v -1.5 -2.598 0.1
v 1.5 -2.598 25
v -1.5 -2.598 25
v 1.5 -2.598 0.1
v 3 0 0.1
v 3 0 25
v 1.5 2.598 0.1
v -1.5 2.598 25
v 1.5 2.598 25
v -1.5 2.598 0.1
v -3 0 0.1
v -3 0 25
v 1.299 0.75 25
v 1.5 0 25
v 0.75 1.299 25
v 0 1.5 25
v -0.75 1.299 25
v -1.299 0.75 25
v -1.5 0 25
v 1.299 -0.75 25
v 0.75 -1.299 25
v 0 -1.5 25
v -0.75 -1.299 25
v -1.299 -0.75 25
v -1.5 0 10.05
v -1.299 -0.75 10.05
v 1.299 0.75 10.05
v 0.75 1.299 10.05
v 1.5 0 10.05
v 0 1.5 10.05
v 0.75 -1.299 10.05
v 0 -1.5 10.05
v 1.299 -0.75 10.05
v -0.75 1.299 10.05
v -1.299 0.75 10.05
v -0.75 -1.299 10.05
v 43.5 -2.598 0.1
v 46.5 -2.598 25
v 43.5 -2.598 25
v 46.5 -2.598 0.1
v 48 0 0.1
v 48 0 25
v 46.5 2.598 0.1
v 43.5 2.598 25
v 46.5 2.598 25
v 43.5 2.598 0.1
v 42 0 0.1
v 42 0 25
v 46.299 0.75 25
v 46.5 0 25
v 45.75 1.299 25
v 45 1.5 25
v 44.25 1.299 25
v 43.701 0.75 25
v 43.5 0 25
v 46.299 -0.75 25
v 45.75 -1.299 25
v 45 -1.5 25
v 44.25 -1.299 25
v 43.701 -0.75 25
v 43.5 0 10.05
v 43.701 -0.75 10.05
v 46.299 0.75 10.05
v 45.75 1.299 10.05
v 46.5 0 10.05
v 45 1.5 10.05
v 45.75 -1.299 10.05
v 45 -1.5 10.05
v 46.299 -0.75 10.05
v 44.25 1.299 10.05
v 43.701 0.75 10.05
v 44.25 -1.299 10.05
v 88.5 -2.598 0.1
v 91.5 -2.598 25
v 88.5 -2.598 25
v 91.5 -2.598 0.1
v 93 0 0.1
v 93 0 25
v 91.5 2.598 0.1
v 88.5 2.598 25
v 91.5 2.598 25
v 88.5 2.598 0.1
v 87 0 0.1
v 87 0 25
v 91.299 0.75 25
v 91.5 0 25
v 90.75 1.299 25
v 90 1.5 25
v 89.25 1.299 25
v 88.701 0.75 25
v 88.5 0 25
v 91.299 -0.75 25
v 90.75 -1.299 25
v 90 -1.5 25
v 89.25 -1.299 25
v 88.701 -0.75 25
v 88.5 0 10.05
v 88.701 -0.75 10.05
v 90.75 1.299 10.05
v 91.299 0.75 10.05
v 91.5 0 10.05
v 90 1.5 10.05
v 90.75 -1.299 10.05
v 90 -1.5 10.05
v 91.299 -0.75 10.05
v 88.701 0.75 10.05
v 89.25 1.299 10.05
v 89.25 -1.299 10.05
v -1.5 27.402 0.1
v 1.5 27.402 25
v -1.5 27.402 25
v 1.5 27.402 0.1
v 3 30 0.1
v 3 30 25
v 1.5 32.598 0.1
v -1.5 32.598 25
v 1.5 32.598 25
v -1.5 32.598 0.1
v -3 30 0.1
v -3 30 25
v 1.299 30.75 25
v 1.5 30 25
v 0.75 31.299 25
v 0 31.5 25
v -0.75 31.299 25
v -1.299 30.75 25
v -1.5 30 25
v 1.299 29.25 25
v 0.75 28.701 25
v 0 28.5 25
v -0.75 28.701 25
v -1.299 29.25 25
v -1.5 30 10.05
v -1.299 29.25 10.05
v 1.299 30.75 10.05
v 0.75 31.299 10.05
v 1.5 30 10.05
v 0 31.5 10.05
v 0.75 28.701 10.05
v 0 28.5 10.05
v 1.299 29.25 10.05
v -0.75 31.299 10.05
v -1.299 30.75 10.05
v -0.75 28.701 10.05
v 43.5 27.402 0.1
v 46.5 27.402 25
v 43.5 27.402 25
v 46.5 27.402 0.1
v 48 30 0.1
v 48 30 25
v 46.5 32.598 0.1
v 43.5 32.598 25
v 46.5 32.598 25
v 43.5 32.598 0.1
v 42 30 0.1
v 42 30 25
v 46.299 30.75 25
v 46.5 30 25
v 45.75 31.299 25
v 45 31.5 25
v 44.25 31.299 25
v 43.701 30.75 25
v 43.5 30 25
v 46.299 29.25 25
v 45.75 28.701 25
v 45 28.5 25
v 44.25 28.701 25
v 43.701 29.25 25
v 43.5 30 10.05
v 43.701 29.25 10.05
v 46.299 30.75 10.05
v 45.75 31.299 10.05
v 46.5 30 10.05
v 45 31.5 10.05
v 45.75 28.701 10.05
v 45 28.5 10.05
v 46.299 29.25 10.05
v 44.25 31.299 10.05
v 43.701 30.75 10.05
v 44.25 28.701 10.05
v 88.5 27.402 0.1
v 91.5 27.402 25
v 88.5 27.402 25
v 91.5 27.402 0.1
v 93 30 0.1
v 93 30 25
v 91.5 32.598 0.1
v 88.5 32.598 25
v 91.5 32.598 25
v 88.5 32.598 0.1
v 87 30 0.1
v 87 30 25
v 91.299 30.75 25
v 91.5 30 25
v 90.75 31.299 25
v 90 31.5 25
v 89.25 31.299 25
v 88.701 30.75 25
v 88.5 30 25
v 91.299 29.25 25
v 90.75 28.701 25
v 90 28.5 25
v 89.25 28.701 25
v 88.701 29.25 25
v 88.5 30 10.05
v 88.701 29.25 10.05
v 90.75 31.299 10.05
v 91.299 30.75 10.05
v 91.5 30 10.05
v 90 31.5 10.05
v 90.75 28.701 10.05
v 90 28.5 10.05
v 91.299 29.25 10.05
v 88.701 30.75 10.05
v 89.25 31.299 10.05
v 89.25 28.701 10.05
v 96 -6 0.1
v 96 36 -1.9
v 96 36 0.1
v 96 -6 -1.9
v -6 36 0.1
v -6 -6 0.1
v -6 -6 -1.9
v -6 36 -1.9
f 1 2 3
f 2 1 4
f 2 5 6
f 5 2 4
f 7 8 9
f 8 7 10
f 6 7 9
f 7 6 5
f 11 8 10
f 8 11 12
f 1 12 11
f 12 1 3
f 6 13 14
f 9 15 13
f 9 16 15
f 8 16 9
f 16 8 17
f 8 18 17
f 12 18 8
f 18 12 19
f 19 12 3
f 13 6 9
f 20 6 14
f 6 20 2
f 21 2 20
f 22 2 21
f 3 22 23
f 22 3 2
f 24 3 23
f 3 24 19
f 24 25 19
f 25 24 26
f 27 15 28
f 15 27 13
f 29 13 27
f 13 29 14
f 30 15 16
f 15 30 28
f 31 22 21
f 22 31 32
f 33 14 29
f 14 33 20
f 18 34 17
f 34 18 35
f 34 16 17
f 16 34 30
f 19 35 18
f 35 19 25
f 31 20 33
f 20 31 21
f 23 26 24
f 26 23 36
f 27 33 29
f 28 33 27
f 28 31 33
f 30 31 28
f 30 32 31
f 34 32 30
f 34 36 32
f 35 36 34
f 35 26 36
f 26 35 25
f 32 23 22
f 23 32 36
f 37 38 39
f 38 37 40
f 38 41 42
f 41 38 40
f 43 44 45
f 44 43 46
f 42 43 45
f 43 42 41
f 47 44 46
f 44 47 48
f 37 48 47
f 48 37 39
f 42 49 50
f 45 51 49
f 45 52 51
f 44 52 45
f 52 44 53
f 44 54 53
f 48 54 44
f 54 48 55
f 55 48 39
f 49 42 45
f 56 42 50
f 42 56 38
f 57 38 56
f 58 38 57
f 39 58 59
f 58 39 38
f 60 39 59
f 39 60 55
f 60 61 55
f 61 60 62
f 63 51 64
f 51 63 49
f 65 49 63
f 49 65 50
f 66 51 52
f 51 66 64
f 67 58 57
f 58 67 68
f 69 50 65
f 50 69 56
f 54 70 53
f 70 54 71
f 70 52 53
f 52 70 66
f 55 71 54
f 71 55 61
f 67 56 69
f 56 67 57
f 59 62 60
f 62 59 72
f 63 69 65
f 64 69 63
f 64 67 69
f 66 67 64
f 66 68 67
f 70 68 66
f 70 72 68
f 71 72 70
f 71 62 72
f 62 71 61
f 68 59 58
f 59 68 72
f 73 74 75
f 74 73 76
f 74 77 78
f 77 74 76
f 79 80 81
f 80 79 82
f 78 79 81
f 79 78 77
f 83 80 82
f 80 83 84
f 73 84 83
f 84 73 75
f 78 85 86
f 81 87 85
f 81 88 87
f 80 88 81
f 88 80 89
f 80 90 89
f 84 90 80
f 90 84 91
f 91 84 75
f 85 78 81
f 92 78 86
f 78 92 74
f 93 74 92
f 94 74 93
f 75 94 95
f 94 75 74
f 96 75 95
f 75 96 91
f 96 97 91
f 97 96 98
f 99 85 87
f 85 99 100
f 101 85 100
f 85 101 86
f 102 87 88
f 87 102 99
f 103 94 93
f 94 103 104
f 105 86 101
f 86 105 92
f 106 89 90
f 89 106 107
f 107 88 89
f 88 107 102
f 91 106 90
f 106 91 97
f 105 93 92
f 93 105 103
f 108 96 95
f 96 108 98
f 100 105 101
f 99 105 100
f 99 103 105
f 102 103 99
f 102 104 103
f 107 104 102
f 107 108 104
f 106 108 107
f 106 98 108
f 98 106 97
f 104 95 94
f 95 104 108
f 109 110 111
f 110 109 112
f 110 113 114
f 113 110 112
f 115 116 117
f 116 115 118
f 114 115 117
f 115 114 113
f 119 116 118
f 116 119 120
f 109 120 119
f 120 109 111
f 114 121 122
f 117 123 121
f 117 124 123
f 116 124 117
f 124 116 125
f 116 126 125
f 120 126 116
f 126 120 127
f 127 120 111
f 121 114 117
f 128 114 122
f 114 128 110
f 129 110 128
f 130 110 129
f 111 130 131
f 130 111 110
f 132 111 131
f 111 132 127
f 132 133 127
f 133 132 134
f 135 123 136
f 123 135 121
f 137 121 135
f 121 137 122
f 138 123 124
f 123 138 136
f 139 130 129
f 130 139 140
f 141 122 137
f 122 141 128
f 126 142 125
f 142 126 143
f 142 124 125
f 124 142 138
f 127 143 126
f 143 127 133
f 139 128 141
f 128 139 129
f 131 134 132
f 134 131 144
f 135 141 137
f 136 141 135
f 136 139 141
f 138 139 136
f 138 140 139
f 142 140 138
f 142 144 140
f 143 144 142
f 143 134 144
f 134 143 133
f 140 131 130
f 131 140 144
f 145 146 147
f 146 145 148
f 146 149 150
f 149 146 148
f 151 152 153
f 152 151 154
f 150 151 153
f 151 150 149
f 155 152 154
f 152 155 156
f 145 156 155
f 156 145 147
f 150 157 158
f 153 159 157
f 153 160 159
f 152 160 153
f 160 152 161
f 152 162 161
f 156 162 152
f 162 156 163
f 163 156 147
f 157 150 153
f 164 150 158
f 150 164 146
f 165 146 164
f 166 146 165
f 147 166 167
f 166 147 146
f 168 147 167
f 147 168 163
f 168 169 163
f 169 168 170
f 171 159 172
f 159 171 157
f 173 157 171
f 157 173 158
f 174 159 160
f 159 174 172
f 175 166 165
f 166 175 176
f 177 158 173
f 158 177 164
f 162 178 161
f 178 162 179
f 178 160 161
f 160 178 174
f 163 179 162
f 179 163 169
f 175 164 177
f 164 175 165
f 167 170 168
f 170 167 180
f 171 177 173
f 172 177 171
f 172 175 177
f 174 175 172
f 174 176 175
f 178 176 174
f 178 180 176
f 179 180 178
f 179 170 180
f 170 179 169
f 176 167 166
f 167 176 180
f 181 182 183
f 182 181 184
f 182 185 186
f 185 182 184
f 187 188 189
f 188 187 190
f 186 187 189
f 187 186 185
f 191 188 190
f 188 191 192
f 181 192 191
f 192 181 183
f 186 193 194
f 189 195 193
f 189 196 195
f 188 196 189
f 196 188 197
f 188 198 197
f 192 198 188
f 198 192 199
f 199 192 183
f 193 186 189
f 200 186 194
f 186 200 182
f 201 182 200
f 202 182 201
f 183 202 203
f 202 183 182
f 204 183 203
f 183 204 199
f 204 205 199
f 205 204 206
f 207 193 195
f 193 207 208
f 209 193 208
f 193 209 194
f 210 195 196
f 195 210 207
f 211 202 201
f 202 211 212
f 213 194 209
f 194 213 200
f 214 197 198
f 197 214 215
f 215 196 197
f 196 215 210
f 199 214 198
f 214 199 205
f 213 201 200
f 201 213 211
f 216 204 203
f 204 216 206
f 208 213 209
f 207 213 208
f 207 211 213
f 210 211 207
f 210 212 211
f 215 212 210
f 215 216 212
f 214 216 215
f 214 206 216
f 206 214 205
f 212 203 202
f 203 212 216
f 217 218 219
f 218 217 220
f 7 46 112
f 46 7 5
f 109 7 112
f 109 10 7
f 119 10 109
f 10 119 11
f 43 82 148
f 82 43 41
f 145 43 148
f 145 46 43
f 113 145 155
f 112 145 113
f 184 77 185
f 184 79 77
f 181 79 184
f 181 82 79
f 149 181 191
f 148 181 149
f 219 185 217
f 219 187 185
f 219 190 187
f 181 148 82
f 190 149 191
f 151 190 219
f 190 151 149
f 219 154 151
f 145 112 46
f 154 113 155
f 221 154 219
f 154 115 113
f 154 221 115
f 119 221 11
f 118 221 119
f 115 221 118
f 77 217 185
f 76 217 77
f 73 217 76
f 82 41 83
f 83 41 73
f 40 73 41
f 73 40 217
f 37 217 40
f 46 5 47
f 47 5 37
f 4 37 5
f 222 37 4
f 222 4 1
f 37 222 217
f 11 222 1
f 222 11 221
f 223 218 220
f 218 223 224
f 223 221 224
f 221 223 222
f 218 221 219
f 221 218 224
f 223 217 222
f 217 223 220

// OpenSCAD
//Standoff Customizer v0.0.8 
//by eriqjo February 20, 2015

//REVISION HISTORY
//v1.0  Fix issues with customizer
//v0.0.8 Increased max height to 45, added option for hole/flat top
//V0.0.7 A different approach to making an array of standoffs
//v0.0.6 Added option for array of standoffs
//v0.0.5 Added feature for rectangular foot on bottom of standoff
//v0.0.4 Changed all cylinders to radius based
//v0.0.1 Initial release of standoff customizer

//CUSTOMIZER VARIABLES

/* [Body Parameters] */

//Type of standoff(s) to create
Style = 2; // [1:Single, 2:Array]

//Choose shape of the main body
Body_Shape = 3; // [1:Round, 2:Square, 3:Hex]

//Define the height of the body, mm
Body_Height = 25; // [3:45]

//Define the diameter of the body, mm
Body_Diameter = 6;

//Choose the style of the top section
Top_Style = 2; //[1:Male, 2:Female, 3:Flat]

//Outer diameter of threaded portion, mm
Thread_Dia = 3;

//Define the height/depth of the top feature, mm
Thread_Height = 15;

//Define thickness of the base, mm
Base_Thickness = 2;


/* [Single Options] */

//Features to include on base
Base_Type = 3; // [1:Hole Only, 2:Rectangular Base Only, 3:Base and Hole, 4:Neither]

//Define the diameter of the bottom clearance hole, mm
Bottom_Hole_Dia = 3;

//Define length in x-direction, mm
Base_X = 12;

//Define length in y-direction, mm
Base_Y = 35;

/* [Array Options] */

//Number of columns, x-direction
Columns = 3;

//Center-to-Center distance for columns, mm
X_Offset = 45;

//Number of rows, y-direction
Rows = 2;

//Center-to-Center distance for rows, mm
Y_Offset = 30;

//How far past the edge of the standoffs the base extends, mm
Added_Base = 3;

//CUSTOMIZER VARIABLES END

bodyR = Body_Diameter/2;
bottomR = Bottom_Hole_Dia/2;
threadR = Thread_Dia/2;


module makeBody(shape) {

//round************************************************************************************************
	if(shape == 1) {	//round
		if(Top_Style == 1){   //male
			union(){
				translate([0, 0, Body_Height/2])
					cylinder(Body_Height, r = bodyR, center = true, $fn = 12);
				translate([0,0, Body_Height + Thread_Height/2 - 0.1])
					cylinder(Thread_Height + 0.1, r = threadR, $fn = 12, center = true);
			} //u
		}// if topstyle = 1
		
				if(Top_Style == 2){   //female
			difference(){
				translate([0, 0, Body_Height/2])
					cylinder(Body_Height, r = bodyR, center = true, $fn = 12);
				translate([0,0, Body_Height - Thread_Height/2 + 0.1])
					cylinder(Thread_Height + 0.1, r = threadR, $fn = 12, center = true);
			} //d
		}// if topstyle = 2
		
		if(Top_Style == 3){   //flat
			translate([0, 0, Body_Height/2])
				cylinder(Body_Height, r = bodyR, center = true, $fn = 12);							
		}// if topstyle = 3	
				
	} //if
	
	
//square****************************************************************************************************
	if(shape == 2) {	//square
		if(Top_Style == 1){  //male
			union(){
				translate([0,0, Body_Height + Thread_Height/2 - 0.1])
					cylinder(h = Thread_Height + 0.1, r = threadR, $fn = 12, center = true);
				translate([0,0, Body_Height/2])
					cube([Body_Diameter, Body_Diameter, Body_Height], center = true);
			} //u
		} //if topstyle = 1
		
		if(Top_Style == 2){  //female
			difference(){
				translate([0,0, Body_Height/2])
					cube([Body_Diameter, Body_Diameter, Body_Height], center = true);
				translate([0,0, Body_Height - Thread_Height/2 + 0.1])
					cylinder(h = Thread_Height + 0.1, r = threadR, $fn = 12, center = true);
			} //d
		} //if topstyle = 2		
		
		if(Top_Style == 3){  //flat
			translate([0,0, Body_Height/2])
				cube([Body_Diameter, Body_Diameter, Body_Height], center = true);
		} //if topstyle = 3	
		
	} //if square
	
	
//hex**********************************************************************************************************
	if(shape == 3) {	//hex
		if(Top_Style == 1){  //male
			union(){
				translate([0,0, Body_Height + Thread_Height/2 - 0.1])
					cylinder(h = Thread_Height + 0.1, r = threadR, $fn = 12, center = true);
				cylinder(h = Body_Height, r = bodyR, center = false, $fn = 6);
			} //u
		} // if topstyle = 1
		
		if(Top_Style == 2){  //female
			difference(){
				cylinder(h = Body_Height, r = bodyR, center = false, $fn = 6);
				translate([0,0, Body_Height - Thread_Height/2 + 0.1])
					cylinder(h = Thread_Height + 0.1, r = threadR, $fn = 12, center = true);
			} //u
		} // if topstyle = 2
		
		if(Top_Style == 3){ // flat
			cylinder(h = Body_Height, r = bodyR, center = false, $fn = 6);
		}//if topstyle = 3
	} //if hex
	
	
} //module

module makeBase(){
	if(Base_Type == 2 || Base_Type == 3){
	 translate([0, 0, Base_Thickness/2])
		cube([Base_X, Base_Y, Base_Thickness], center = true);	
	} //if
} //module

module makeHole(){
	if(Base_Type == 1 || Base_Type == 3){
		translate([0, 0, (Body_Height - 1)/2])
			cylinder(h = Body_Height - 0.9, r = bottomR, $fn = 12, center = true);
	} //if
} //module

//Runtime
if (Style == 1){   //single standoff
	difference(){
		union(){
			makeBody(Body_Shape);
			makeBase();
		} //u
		makeHole();
	} //d
} //if



//The new way

baseShift = Body_Diameter/2 + Added_Base;
baseX = (Columns - 1) * X_Offset + Body_Diameter + (2 * Added_Base);
baseY = (Rows - 1) * Y_Offset + Body_Diameter + (2 * Added_Base);

if (Style == 2){  //array

	union(){
		for (j = [0 : Rows - 1]){     //replace 3 with Rows
			translate([0,j * Y_Offset,0])
				for( i = [0 : Columns - 1]){   //replace 4 with Columns
					translate([i * X_Offset,0,0])
						makeBody(Body_Shape);
				}//for
		}//for
		translate([-baseShift, -baseShift, -Base_Thickness + 0.1])
			cube(size = [baseX, baseY, Base_Thickness], center = false);
	} //union
}//if
